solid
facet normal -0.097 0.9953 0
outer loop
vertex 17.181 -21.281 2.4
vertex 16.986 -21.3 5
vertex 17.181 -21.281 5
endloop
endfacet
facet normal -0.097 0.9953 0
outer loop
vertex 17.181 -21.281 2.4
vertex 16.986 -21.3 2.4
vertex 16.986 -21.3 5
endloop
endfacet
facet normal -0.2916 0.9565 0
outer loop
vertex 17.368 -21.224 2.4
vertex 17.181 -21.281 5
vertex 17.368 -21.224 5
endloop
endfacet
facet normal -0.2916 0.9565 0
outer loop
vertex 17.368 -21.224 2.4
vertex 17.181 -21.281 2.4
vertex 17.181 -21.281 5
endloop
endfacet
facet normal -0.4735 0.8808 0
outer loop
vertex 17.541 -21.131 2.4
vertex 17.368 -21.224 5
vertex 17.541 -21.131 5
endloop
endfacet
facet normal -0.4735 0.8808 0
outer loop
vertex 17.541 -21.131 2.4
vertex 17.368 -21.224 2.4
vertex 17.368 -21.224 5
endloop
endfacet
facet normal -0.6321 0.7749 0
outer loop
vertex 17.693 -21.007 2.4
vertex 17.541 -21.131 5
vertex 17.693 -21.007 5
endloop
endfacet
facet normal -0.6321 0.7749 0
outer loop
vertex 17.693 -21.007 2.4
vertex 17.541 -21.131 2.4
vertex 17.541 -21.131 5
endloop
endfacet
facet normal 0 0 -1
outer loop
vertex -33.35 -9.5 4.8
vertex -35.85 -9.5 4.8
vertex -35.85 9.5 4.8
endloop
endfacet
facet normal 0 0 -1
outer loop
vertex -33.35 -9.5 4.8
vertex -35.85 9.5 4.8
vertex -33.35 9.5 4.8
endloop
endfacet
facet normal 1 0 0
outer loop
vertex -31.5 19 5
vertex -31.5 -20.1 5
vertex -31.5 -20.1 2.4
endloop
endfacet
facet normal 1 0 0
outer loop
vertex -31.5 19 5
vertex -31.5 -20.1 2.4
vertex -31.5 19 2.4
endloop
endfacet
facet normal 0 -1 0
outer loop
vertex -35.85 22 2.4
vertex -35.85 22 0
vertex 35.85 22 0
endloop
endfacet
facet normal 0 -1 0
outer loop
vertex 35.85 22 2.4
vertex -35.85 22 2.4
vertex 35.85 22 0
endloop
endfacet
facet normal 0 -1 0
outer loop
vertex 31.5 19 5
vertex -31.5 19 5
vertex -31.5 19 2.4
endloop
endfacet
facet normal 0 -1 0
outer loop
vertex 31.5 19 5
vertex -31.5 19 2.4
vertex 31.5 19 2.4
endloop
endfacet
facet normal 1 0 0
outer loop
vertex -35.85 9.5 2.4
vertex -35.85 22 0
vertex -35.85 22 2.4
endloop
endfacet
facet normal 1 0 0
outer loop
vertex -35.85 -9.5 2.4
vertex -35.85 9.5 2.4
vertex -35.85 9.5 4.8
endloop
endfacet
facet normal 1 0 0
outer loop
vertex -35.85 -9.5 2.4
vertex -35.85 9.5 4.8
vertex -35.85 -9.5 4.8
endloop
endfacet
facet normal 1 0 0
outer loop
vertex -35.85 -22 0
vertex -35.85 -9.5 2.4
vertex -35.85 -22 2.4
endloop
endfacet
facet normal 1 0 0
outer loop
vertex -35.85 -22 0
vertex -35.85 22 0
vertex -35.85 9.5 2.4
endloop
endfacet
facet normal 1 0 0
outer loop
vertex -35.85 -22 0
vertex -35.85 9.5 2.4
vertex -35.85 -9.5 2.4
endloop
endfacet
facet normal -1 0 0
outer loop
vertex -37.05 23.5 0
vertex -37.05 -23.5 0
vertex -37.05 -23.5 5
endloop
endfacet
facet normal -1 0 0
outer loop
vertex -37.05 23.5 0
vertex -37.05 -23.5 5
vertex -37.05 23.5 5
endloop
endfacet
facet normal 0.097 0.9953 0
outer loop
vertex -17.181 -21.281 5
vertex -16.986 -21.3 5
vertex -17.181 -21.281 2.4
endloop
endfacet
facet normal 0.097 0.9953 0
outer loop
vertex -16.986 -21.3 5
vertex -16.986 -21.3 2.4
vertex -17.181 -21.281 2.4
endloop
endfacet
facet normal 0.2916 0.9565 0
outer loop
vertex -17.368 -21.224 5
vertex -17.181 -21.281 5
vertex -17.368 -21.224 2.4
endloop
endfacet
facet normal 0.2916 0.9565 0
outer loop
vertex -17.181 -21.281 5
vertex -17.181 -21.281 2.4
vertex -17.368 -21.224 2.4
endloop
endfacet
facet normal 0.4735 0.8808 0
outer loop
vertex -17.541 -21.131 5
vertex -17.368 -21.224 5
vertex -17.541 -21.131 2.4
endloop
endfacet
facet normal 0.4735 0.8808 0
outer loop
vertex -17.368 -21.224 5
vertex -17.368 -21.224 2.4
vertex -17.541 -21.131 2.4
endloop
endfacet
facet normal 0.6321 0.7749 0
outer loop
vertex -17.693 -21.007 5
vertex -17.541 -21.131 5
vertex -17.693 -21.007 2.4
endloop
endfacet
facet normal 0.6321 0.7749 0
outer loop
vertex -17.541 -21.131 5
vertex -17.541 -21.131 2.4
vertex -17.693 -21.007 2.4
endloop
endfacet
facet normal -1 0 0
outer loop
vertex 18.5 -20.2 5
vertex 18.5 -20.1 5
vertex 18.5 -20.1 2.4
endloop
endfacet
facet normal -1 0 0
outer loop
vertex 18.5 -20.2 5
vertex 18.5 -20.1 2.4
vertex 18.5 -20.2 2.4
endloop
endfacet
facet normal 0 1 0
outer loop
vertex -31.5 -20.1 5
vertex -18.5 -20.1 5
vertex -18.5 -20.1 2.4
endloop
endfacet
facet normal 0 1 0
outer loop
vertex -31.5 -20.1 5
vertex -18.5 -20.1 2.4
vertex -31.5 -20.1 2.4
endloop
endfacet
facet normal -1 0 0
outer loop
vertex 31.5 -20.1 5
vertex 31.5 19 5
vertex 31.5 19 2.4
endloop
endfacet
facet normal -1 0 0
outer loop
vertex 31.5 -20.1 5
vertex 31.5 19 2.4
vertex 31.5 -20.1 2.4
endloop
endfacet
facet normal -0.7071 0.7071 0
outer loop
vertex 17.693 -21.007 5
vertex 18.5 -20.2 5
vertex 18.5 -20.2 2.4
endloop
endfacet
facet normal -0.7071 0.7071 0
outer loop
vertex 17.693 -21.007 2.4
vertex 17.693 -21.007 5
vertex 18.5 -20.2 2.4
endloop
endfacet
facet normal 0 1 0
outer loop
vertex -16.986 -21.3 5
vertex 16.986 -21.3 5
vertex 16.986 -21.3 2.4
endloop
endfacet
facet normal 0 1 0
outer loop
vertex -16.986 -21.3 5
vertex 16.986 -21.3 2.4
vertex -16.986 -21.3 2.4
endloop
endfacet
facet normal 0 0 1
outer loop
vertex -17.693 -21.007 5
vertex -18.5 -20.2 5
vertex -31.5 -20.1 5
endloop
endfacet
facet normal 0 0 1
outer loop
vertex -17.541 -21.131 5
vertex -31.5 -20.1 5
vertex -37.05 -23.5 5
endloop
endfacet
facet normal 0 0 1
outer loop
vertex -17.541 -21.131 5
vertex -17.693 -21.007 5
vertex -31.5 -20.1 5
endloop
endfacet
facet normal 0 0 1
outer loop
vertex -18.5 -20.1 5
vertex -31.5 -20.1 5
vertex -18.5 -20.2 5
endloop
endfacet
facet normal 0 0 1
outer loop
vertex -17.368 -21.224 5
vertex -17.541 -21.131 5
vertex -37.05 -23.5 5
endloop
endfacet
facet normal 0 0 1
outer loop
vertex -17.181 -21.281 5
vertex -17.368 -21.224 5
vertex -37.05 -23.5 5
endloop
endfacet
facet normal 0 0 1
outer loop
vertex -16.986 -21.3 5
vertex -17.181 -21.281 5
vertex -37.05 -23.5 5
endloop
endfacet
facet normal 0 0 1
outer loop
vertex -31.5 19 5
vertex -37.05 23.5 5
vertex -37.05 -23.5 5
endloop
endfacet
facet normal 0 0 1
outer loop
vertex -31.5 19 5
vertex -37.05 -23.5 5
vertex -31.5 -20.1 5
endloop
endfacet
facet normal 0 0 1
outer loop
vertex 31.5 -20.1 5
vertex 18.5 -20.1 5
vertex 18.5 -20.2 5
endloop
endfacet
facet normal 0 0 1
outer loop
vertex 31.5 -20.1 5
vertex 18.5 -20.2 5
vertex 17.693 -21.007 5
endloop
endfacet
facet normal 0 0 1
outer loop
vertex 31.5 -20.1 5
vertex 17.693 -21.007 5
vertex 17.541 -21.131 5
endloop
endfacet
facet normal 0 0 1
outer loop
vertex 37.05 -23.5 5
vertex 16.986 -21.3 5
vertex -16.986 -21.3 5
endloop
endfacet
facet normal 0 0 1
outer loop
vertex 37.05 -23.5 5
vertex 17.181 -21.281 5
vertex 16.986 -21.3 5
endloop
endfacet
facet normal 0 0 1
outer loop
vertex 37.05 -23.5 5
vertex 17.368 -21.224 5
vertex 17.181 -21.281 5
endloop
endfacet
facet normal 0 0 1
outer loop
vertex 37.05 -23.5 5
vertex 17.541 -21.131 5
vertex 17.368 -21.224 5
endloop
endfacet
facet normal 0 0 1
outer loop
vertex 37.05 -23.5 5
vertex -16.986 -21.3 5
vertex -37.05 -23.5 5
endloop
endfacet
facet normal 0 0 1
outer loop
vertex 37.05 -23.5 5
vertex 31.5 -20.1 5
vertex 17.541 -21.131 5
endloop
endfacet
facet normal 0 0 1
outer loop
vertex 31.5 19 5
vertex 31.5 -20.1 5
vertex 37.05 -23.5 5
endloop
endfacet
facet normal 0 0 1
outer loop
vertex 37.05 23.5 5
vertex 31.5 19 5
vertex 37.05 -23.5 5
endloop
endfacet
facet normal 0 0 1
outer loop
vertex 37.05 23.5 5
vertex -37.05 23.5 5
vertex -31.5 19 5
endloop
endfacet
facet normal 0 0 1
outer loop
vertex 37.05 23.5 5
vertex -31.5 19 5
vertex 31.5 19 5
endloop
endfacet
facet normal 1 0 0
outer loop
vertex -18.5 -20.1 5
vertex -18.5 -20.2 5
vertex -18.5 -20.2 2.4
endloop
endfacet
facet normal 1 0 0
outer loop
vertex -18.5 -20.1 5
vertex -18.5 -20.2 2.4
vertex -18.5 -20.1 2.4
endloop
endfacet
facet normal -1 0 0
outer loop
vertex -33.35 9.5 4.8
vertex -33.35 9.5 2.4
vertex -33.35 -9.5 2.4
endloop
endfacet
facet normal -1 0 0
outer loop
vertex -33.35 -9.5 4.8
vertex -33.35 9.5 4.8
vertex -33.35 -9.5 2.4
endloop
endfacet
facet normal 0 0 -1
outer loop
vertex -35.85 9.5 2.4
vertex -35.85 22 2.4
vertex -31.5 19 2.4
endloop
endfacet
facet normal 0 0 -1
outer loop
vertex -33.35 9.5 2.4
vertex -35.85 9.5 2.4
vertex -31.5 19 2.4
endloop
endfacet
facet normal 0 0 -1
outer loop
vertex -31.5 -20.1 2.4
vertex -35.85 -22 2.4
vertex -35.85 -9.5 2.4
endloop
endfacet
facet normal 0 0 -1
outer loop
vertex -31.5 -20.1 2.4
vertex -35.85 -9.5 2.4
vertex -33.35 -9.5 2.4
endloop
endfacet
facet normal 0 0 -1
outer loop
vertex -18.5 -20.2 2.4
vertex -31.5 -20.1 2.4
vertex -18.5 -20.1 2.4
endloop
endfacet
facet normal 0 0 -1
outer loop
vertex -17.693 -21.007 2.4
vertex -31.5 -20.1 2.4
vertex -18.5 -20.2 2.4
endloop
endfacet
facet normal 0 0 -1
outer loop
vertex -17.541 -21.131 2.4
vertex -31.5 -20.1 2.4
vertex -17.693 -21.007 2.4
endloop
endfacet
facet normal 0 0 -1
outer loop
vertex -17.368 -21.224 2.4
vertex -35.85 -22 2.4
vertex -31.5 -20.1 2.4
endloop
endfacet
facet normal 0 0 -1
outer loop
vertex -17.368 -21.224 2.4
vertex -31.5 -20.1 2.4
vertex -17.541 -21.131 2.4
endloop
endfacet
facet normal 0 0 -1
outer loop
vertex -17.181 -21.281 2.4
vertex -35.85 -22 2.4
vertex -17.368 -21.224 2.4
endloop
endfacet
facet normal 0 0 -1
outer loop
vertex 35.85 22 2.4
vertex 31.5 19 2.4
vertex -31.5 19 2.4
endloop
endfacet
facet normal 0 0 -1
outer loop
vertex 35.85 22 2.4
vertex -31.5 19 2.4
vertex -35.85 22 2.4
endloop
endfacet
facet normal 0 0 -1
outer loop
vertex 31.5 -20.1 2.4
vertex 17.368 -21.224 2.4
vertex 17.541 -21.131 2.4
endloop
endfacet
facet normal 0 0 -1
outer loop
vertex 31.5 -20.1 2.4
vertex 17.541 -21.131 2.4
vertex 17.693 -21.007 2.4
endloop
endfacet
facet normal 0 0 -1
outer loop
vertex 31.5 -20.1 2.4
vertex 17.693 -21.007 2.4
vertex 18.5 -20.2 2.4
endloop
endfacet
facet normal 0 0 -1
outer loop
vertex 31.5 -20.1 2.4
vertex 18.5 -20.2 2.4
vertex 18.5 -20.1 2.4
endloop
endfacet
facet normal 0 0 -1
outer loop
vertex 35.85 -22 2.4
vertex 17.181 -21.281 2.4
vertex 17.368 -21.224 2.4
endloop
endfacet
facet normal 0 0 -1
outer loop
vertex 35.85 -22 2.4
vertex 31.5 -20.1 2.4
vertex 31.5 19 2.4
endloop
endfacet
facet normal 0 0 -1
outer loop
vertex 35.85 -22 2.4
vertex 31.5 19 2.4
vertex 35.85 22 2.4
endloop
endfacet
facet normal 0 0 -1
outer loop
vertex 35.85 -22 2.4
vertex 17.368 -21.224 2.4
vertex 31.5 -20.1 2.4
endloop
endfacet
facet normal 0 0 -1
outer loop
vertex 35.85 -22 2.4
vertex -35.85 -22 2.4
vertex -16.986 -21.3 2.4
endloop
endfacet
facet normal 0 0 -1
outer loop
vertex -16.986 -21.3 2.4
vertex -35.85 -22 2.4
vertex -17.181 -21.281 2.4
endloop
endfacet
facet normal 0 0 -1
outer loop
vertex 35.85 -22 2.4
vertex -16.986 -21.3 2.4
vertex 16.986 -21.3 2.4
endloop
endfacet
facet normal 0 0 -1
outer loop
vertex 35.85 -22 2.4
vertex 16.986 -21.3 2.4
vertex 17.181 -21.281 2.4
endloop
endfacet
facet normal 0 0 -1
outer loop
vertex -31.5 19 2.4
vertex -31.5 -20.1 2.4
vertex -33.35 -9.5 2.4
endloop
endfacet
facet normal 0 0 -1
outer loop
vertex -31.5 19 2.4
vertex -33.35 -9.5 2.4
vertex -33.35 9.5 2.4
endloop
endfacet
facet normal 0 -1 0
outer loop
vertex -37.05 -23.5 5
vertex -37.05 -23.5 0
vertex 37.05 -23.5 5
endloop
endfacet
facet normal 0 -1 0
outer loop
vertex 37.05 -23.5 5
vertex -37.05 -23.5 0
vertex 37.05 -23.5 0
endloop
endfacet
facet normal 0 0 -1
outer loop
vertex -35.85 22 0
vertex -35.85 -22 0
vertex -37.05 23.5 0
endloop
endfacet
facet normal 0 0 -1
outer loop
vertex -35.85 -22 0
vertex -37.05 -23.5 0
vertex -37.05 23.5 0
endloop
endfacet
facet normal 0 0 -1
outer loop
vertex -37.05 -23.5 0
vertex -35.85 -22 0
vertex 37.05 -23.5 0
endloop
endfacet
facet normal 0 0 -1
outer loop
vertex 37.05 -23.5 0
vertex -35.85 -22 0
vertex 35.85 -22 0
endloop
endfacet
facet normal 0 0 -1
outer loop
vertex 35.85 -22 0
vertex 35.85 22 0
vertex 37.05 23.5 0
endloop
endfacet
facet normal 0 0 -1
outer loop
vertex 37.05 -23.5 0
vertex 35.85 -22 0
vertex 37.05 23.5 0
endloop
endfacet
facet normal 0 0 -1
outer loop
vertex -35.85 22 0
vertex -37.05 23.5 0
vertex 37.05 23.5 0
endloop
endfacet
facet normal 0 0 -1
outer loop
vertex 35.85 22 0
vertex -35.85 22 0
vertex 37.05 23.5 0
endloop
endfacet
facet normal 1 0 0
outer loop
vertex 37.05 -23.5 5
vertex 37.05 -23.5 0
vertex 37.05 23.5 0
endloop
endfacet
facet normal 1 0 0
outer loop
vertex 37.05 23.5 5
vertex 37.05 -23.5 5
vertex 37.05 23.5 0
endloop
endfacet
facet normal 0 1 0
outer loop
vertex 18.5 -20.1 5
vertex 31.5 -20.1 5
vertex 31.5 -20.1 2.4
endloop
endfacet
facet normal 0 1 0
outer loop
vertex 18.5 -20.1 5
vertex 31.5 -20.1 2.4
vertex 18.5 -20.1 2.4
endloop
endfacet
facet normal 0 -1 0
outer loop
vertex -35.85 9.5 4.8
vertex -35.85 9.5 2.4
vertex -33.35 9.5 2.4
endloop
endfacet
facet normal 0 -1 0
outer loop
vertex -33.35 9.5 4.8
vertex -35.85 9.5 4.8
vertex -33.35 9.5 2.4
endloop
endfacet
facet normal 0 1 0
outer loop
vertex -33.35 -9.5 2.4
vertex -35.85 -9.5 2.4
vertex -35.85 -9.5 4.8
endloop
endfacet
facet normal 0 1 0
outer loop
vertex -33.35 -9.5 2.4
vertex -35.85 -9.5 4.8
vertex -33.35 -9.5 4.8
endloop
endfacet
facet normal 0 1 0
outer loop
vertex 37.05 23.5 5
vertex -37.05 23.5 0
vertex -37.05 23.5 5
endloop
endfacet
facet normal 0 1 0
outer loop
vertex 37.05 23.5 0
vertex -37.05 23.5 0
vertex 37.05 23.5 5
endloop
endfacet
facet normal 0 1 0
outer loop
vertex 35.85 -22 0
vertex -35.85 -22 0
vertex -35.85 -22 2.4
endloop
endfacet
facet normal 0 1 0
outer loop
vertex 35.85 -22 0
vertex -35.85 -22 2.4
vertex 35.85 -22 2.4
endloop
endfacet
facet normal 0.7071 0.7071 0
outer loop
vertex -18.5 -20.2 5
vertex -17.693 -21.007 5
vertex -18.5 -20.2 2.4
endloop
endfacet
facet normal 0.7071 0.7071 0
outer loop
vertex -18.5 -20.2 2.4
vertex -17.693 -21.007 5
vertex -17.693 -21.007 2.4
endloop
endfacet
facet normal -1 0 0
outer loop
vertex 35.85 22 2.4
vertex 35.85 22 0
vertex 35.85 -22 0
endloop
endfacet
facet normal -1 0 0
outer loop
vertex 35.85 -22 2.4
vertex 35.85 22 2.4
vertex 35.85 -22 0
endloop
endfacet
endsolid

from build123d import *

# Parameters (mm, degrees)
SKETCH_W        = 74.1
SKETCH_H        = 47
PAD_DEPTH       = 5
SKETCH001_W     = 71.7
SKETCH001_H     = 44
POCKET_DEPTH    = 2.4
POCKET001_DEPTH = 5
SKETCH004_W     = 2.5
SKETCH004_H     = 19
POCKET002_DEPTH = 2.4
CHAMFER_SIZE    = 1.1
CHAMFER001_SIZE = 1.1
FILLET_R        = 1
FILLET001_R     = 1


with BuildPart() as part:
    # Sketch → Pad (new body)
    with BuildSketch(Plane.XY):
        Rectangle(SKETCH_W, SKETCH_H)
    extrude(amount=PAD_DEPTH)

    # Sketch001 (on Face5 of Pad) → Pocket (cut)
    with BuildSketch(Plane(origin=(0, 0, 0), x_dir=(1, 0, 0), z_dir=(0, 0, -1))):
        Rectangle(SKETCH001_W, SKETCH001_H)
    extrude(amount=-POCKET_DEPTH, mode=Mode.SUBTRACT)

    # Sketch002 (on Face5 of Pocket) → Pocket001 (cut)
    with BuildSketch(Plane.XY.offset(5)):
        Polygon((-31.5, 19), (31.5, 19), (31.5, -20.1), (18.5, -20.1), (18.5, -21.3), (-18.5, -21.3), (-18.5, -20.1), (-31.5, -20.1), align=None)
    extrude(amount=-POCKET001_DEPTH, mode=Mode.SUBTRACT)

    # Sketch004 (on Face19 of Pocket001) → Pocket002 (cut)
    with BuildSketch(Plane(origin=(0, 0, 2.4), x_dir=(1, 0, 0), z_dir=(0, 0, -1))):
        with Locations((-34.6, 0)):
            Rectangle(SKETCH004_W, SKETCH004_H)
    extrude(amount=-POCKET002_DEPTH, mode=Mode.SUBTRACT)

    # Chamfer
    chamfer_edges = [part.edges().sort_by_distance(p)[0] for p in [
        (-18.5, -21.3, 3.7),
    ]]
    chamfer(chamfer_edges, length=CHAMFER_SIZE)

    # Chamfer001
    chamfer001_edges = [part.edges().sort_by_distance(p)[0] for p in [
        (18.5, -21.3, 3.7),
    ]]
    chamfer(chamfer001_edges, length=CHAMFER001_SIZE)

    # Fillet
    fillet_edges = [part.edges().sort_by_distance(p)[0] for p in [
        (17.4, -21.3, 3.7),
    ]]
    fillet(fillet_edges, radius=FILLET_R)

    # Fillet001
    fillet001_edges = [part.edges().sort_by_distance(p)[0] for p in [
        (-17.4, -21.3, 3.7),
    ]]
    fillet(fillet001_edges, radius=FILLET001_R)


solid = part.part
